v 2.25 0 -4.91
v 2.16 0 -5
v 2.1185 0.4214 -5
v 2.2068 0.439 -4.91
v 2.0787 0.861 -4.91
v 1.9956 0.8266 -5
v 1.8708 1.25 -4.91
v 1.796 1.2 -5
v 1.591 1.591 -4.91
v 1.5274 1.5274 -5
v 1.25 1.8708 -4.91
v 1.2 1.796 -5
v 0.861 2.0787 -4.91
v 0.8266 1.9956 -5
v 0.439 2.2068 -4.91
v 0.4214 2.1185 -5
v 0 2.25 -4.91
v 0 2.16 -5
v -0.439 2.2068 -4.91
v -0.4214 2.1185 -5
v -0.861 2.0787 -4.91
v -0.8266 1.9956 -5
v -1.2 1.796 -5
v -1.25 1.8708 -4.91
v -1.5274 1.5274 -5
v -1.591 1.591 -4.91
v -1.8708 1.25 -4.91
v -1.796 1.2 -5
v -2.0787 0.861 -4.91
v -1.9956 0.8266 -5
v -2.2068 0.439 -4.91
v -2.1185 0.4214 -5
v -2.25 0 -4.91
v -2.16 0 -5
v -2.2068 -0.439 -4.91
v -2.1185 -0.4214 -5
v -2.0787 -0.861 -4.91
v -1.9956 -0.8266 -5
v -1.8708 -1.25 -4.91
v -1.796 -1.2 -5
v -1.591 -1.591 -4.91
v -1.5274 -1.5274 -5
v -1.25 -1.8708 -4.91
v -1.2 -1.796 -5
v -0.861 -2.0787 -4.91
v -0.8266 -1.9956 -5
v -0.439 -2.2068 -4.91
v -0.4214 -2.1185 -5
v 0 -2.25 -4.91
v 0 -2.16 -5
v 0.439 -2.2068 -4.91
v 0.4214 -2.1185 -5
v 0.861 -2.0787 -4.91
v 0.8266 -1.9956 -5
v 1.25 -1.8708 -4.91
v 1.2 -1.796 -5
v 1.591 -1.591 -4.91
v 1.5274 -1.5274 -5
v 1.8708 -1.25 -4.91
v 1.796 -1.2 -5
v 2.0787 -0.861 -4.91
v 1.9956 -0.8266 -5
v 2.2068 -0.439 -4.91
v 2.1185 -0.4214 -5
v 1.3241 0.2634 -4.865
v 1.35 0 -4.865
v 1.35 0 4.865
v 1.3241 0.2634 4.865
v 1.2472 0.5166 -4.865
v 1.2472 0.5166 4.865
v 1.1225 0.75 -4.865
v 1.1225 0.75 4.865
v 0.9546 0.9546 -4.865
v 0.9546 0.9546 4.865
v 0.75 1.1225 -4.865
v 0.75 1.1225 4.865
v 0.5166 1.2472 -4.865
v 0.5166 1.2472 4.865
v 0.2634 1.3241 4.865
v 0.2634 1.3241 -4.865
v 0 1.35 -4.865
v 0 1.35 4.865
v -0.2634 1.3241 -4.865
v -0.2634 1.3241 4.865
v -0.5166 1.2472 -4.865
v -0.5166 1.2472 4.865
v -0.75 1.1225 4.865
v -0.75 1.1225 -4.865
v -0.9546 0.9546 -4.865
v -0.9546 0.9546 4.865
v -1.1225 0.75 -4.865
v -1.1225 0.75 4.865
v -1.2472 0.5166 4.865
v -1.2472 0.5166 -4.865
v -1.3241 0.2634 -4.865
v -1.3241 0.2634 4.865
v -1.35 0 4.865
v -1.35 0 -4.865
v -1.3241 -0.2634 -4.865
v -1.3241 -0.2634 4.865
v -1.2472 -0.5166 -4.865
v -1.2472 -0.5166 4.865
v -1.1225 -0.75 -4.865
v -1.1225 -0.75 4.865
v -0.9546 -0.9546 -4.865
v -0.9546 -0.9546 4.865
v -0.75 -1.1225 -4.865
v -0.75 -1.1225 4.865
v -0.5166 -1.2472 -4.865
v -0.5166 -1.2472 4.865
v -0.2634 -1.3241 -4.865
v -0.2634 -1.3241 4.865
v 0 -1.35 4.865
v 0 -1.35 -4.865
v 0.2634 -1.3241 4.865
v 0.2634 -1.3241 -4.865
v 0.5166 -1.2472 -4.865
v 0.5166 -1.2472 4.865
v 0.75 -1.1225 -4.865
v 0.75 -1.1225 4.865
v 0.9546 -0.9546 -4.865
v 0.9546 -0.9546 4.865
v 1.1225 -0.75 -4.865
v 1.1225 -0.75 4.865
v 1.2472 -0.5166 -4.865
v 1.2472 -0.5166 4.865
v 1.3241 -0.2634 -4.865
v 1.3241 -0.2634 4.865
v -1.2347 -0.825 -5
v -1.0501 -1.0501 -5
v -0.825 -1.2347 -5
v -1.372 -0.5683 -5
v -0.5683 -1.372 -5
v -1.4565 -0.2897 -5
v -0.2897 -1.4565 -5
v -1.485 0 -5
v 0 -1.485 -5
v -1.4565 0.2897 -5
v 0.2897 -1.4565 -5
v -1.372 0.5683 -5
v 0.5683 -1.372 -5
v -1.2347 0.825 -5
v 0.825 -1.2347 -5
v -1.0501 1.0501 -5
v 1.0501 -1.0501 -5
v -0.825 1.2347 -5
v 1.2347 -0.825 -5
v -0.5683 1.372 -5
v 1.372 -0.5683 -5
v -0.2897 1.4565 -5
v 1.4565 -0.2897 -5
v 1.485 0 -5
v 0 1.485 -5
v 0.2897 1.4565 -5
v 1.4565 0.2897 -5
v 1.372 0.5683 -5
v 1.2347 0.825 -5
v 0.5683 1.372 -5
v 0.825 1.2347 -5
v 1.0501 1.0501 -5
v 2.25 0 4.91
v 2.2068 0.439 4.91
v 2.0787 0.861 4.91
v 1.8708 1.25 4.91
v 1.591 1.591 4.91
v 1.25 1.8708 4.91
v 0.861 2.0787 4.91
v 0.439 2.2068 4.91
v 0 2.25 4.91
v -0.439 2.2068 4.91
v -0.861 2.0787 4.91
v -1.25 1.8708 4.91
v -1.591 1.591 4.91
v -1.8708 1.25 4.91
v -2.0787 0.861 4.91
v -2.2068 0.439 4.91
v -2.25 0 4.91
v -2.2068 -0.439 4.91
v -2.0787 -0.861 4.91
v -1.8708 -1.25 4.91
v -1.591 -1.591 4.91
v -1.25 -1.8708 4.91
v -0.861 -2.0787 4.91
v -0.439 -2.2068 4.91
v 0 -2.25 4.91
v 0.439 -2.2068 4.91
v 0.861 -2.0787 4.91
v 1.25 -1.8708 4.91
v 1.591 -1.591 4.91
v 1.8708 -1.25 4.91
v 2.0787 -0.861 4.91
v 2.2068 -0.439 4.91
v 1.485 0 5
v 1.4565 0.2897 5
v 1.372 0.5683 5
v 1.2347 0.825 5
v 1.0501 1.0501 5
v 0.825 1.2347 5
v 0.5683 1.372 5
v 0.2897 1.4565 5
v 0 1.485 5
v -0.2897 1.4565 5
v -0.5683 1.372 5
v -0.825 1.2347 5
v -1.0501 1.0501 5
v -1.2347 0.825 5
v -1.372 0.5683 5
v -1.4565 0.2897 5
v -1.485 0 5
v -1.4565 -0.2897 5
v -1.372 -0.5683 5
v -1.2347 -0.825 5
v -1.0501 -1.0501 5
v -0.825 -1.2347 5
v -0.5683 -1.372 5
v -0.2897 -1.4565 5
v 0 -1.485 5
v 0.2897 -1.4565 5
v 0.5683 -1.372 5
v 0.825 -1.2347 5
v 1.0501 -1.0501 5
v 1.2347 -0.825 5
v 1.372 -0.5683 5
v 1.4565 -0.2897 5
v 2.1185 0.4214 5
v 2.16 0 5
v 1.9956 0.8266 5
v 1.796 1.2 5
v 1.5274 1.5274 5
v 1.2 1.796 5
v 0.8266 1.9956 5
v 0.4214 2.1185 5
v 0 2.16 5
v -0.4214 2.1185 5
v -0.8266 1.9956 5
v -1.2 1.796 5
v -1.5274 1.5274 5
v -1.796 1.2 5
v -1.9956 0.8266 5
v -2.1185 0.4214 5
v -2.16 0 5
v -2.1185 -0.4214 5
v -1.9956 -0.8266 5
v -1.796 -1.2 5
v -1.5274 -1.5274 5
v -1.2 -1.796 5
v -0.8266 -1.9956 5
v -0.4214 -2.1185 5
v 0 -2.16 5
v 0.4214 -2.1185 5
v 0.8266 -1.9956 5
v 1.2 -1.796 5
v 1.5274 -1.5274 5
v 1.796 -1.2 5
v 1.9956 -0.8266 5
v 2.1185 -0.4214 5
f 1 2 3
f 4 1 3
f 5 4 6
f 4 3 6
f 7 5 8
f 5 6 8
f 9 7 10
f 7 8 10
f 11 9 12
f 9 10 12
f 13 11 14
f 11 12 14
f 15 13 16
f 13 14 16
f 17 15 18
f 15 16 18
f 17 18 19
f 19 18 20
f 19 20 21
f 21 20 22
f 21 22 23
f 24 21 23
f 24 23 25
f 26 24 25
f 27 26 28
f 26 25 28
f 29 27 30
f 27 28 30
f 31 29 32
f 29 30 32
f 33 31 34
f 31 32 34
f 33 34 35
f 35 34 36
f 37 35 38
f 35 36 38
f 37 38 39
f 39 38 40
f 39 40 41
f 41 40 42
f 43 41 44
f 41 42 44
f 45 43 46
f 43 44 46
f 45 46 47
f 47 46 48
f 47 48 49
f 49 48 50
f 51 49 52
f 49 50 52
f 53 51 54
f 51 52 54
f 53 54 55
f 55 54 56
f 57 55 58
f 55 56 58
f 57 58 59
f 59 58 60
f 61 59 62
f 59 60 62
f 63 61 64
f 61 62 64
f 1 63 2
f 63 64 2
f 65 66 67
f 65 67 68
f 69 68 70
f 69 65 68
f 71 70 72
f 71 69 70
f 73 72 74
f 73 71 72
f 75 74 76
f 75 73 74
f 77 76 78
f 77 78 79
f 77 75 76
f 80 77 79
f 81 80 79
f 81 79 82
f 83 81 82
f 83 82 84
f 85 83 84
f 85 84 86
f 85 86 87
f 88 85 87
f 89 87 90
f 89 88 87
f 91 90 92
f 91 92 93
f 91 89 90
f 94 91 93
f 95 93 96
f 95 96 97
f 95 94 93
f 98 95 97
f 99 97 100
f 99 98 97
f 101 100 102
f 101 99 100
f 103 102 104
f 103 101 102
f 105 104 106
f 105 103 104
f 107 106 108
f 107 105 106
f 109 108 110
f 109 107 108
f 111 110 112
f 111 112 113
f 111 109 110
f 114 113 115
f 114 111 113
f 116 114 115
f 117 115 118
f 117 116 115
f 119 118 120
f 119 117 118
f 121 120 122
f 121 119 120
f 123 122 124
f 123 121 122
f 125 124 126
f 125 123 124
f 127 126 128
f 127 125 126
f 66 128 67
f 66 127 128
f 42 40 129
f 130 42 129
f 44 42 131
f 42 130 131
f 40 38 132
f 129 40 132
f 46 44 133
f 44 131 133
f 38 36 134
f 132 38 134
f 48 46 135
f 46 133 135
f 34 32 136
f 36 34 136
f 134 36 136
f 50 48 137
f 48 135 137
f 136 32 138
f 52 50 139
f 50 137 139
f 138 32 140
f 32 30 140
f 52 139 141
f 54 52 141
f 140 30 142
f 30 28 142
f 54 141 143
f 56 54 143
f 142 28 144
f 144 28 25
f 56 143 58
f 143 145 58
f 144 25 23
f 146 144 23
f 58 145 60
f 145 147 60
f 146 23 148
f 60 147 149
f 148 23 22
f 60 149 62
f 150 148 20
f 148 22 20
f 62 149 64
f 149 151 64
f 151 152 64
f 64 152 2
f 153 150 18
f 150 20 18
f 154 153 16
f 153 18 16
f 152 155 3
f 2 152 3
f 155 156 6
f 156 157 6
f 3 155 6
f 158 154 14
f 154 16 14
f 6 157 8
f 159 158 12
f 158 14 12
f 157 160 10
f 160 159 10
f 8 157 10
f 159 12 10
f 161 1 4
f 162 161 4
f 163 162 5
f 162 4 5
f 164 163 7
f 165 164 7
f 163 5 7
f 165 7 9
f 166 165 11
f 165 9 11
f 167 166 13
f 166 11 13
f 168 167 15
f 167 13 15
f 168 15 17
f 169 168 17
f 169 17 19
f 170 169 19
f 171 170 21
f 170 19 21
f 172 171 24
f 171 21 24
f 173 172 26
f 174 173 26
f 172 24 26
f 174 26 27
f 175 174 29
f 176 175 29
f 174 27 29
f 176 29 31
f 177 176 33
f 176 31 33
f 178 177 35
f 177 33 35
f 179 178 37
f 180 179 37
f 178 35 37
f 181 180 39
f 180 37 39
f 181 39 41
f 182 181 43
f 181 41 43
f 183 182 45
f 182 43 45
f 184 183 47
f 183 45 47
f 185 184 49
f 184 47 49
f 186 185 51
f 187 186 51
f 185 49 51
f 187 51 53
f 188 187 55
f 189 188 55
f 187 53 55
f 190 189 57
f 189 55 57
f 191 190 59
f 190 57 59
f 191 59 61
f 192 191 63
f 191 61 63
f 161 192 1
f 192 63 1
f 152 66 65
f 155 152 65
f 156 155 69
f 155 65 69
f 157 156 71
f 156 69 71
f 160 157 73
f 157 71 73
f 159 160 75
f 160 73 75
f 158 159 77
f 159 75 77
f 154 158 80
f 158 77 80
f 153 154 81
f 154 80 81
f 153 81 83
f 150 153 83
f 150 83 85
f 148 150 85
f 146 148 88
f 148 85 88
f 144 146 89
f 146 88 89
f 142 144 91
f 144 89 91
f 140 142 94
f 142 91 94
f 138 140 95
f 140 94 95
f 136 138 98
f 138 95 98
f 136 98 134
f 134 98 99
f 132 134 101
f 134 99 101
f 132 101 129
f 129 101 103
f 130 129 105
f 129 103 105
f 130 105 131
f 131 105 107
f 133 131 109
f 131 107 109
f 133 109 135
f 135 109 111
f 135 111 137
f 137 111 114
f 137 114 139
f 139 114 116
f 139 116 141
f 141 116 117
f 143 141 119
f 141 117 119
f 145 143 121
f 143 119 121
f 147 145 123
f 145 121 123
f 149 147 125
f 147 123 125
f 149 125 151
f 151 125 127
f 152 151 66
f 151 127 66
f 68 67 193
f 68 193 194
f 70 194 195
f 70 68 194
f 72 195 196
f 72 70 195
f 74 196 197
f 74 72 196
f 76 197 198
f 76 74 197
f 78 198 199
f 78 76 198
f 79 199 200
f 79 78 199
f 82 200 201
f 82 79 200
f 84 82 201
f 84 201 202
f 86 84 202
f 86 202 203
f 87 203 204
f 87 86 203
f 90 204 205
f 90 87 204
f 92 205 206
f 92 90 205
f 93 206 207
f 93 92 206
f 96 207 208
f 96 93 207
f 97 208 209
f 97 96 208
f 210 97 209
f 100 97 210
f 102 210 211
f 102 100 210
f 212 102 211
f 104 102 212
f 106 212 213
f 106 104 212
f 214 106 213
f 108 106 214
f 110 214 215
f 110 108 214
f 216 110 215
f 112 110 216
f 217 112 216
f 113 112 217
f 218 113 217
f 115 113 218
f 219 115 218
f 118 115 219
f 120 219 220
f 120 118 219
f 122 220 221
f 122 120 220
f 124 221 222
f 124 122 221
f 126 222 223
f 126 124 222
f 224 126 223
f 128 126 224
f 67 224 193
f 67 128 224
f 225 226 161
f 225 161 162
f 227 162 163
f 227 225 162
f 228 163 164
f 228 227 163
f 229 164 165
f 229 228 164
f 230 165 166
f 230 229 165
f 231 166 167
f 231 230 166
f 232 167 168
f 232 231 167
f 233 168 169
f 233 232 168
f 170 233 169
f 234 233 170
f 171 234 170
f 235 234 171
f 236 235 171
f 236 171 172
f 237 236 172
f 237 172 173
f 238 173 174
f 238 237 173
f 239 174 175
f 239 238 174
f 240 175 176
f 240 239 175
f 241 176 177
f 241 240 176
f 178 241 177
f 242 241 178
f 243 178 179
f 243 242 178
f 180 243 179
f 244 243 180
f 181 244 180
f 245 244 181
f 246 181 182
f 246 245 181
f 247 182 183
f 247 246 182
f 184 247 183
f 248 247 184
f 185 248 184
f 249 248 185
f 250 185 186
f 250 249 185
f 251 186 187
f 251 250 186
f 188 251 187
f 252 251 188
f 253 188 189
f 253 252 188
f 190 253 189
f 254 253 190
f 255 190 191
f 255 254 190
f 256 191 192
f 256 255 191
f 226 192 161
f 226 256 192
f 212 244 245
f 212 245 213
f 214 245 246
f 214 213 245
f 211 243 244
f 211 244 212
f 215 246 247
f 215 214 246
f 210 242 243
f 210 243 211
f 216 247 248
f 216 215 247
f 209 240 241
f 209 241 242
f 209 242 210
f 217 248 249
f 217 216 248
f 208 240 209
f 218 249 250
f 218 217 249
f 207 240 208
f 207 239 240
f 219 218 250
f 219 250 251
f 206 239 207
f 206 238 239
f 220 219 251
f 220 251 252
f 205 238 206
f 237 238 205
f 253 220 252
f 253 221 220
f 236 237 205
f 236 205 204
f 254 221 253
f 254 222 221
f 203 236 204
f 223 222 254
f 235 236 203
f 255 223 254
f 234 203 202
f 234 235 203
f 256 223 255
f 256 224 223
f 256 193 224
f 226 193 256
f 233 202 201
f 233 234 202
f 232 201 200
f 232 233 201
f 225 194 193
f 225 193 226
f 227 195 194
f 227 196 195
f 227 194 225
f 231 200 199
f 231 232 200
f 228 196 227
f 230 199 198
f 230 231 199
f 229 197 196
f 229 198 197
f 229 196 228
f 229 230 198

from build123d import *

# Parameters (mm, degrees)
BOSS_EXTRUDE1_DEPTH      = 5
BOSS_EXTRUDE1_DEPTH_BACK = 5
SKETCH3_R                = 2.25
SKETCH3_R_2              = 1.35
CHAMFER1_SIZE            = 0.09
CHAMFER2_SIZE            = 0.135


with BuildPart() as part:
    # Sketch3 → Boss-Extrude1 (new, two sides: drawn at the far end of the back side and taken through both)
    with BuildSketch(Plane.XY.offset(-BOSS_EXTRUDE1_DEPTH_BACK)):
        Circle(SKETCH3_R)
        Circle(SKETCH3_R_2, mode=Mode.SUBTRACT)
    extrude(amount=BOSS_EXTRUDE1_DEPTH + BOSS_EXTRUDE1_DEPTH_BACK)

    # Chamfer1
    chamfer1_edges = [part.edges().sort_by_distance(p)[0] for p in [
        (-2.25, 0, -5),
        (-2.25, 0, 5),
    ]]
    chamfer(chamfer1_edges, length=CHAMFER1_SIZE)

    # Chamfer2
    chamfer2_edges = [part.edges().sort_by_distance(p)[0] for p in [
        (-1.35, 0, -5),
        (-1.35, 0, 5),
    ]]
    chamfer(chamfer2_edges, length=CHAMFER2_SIZE)


solid = part.part
